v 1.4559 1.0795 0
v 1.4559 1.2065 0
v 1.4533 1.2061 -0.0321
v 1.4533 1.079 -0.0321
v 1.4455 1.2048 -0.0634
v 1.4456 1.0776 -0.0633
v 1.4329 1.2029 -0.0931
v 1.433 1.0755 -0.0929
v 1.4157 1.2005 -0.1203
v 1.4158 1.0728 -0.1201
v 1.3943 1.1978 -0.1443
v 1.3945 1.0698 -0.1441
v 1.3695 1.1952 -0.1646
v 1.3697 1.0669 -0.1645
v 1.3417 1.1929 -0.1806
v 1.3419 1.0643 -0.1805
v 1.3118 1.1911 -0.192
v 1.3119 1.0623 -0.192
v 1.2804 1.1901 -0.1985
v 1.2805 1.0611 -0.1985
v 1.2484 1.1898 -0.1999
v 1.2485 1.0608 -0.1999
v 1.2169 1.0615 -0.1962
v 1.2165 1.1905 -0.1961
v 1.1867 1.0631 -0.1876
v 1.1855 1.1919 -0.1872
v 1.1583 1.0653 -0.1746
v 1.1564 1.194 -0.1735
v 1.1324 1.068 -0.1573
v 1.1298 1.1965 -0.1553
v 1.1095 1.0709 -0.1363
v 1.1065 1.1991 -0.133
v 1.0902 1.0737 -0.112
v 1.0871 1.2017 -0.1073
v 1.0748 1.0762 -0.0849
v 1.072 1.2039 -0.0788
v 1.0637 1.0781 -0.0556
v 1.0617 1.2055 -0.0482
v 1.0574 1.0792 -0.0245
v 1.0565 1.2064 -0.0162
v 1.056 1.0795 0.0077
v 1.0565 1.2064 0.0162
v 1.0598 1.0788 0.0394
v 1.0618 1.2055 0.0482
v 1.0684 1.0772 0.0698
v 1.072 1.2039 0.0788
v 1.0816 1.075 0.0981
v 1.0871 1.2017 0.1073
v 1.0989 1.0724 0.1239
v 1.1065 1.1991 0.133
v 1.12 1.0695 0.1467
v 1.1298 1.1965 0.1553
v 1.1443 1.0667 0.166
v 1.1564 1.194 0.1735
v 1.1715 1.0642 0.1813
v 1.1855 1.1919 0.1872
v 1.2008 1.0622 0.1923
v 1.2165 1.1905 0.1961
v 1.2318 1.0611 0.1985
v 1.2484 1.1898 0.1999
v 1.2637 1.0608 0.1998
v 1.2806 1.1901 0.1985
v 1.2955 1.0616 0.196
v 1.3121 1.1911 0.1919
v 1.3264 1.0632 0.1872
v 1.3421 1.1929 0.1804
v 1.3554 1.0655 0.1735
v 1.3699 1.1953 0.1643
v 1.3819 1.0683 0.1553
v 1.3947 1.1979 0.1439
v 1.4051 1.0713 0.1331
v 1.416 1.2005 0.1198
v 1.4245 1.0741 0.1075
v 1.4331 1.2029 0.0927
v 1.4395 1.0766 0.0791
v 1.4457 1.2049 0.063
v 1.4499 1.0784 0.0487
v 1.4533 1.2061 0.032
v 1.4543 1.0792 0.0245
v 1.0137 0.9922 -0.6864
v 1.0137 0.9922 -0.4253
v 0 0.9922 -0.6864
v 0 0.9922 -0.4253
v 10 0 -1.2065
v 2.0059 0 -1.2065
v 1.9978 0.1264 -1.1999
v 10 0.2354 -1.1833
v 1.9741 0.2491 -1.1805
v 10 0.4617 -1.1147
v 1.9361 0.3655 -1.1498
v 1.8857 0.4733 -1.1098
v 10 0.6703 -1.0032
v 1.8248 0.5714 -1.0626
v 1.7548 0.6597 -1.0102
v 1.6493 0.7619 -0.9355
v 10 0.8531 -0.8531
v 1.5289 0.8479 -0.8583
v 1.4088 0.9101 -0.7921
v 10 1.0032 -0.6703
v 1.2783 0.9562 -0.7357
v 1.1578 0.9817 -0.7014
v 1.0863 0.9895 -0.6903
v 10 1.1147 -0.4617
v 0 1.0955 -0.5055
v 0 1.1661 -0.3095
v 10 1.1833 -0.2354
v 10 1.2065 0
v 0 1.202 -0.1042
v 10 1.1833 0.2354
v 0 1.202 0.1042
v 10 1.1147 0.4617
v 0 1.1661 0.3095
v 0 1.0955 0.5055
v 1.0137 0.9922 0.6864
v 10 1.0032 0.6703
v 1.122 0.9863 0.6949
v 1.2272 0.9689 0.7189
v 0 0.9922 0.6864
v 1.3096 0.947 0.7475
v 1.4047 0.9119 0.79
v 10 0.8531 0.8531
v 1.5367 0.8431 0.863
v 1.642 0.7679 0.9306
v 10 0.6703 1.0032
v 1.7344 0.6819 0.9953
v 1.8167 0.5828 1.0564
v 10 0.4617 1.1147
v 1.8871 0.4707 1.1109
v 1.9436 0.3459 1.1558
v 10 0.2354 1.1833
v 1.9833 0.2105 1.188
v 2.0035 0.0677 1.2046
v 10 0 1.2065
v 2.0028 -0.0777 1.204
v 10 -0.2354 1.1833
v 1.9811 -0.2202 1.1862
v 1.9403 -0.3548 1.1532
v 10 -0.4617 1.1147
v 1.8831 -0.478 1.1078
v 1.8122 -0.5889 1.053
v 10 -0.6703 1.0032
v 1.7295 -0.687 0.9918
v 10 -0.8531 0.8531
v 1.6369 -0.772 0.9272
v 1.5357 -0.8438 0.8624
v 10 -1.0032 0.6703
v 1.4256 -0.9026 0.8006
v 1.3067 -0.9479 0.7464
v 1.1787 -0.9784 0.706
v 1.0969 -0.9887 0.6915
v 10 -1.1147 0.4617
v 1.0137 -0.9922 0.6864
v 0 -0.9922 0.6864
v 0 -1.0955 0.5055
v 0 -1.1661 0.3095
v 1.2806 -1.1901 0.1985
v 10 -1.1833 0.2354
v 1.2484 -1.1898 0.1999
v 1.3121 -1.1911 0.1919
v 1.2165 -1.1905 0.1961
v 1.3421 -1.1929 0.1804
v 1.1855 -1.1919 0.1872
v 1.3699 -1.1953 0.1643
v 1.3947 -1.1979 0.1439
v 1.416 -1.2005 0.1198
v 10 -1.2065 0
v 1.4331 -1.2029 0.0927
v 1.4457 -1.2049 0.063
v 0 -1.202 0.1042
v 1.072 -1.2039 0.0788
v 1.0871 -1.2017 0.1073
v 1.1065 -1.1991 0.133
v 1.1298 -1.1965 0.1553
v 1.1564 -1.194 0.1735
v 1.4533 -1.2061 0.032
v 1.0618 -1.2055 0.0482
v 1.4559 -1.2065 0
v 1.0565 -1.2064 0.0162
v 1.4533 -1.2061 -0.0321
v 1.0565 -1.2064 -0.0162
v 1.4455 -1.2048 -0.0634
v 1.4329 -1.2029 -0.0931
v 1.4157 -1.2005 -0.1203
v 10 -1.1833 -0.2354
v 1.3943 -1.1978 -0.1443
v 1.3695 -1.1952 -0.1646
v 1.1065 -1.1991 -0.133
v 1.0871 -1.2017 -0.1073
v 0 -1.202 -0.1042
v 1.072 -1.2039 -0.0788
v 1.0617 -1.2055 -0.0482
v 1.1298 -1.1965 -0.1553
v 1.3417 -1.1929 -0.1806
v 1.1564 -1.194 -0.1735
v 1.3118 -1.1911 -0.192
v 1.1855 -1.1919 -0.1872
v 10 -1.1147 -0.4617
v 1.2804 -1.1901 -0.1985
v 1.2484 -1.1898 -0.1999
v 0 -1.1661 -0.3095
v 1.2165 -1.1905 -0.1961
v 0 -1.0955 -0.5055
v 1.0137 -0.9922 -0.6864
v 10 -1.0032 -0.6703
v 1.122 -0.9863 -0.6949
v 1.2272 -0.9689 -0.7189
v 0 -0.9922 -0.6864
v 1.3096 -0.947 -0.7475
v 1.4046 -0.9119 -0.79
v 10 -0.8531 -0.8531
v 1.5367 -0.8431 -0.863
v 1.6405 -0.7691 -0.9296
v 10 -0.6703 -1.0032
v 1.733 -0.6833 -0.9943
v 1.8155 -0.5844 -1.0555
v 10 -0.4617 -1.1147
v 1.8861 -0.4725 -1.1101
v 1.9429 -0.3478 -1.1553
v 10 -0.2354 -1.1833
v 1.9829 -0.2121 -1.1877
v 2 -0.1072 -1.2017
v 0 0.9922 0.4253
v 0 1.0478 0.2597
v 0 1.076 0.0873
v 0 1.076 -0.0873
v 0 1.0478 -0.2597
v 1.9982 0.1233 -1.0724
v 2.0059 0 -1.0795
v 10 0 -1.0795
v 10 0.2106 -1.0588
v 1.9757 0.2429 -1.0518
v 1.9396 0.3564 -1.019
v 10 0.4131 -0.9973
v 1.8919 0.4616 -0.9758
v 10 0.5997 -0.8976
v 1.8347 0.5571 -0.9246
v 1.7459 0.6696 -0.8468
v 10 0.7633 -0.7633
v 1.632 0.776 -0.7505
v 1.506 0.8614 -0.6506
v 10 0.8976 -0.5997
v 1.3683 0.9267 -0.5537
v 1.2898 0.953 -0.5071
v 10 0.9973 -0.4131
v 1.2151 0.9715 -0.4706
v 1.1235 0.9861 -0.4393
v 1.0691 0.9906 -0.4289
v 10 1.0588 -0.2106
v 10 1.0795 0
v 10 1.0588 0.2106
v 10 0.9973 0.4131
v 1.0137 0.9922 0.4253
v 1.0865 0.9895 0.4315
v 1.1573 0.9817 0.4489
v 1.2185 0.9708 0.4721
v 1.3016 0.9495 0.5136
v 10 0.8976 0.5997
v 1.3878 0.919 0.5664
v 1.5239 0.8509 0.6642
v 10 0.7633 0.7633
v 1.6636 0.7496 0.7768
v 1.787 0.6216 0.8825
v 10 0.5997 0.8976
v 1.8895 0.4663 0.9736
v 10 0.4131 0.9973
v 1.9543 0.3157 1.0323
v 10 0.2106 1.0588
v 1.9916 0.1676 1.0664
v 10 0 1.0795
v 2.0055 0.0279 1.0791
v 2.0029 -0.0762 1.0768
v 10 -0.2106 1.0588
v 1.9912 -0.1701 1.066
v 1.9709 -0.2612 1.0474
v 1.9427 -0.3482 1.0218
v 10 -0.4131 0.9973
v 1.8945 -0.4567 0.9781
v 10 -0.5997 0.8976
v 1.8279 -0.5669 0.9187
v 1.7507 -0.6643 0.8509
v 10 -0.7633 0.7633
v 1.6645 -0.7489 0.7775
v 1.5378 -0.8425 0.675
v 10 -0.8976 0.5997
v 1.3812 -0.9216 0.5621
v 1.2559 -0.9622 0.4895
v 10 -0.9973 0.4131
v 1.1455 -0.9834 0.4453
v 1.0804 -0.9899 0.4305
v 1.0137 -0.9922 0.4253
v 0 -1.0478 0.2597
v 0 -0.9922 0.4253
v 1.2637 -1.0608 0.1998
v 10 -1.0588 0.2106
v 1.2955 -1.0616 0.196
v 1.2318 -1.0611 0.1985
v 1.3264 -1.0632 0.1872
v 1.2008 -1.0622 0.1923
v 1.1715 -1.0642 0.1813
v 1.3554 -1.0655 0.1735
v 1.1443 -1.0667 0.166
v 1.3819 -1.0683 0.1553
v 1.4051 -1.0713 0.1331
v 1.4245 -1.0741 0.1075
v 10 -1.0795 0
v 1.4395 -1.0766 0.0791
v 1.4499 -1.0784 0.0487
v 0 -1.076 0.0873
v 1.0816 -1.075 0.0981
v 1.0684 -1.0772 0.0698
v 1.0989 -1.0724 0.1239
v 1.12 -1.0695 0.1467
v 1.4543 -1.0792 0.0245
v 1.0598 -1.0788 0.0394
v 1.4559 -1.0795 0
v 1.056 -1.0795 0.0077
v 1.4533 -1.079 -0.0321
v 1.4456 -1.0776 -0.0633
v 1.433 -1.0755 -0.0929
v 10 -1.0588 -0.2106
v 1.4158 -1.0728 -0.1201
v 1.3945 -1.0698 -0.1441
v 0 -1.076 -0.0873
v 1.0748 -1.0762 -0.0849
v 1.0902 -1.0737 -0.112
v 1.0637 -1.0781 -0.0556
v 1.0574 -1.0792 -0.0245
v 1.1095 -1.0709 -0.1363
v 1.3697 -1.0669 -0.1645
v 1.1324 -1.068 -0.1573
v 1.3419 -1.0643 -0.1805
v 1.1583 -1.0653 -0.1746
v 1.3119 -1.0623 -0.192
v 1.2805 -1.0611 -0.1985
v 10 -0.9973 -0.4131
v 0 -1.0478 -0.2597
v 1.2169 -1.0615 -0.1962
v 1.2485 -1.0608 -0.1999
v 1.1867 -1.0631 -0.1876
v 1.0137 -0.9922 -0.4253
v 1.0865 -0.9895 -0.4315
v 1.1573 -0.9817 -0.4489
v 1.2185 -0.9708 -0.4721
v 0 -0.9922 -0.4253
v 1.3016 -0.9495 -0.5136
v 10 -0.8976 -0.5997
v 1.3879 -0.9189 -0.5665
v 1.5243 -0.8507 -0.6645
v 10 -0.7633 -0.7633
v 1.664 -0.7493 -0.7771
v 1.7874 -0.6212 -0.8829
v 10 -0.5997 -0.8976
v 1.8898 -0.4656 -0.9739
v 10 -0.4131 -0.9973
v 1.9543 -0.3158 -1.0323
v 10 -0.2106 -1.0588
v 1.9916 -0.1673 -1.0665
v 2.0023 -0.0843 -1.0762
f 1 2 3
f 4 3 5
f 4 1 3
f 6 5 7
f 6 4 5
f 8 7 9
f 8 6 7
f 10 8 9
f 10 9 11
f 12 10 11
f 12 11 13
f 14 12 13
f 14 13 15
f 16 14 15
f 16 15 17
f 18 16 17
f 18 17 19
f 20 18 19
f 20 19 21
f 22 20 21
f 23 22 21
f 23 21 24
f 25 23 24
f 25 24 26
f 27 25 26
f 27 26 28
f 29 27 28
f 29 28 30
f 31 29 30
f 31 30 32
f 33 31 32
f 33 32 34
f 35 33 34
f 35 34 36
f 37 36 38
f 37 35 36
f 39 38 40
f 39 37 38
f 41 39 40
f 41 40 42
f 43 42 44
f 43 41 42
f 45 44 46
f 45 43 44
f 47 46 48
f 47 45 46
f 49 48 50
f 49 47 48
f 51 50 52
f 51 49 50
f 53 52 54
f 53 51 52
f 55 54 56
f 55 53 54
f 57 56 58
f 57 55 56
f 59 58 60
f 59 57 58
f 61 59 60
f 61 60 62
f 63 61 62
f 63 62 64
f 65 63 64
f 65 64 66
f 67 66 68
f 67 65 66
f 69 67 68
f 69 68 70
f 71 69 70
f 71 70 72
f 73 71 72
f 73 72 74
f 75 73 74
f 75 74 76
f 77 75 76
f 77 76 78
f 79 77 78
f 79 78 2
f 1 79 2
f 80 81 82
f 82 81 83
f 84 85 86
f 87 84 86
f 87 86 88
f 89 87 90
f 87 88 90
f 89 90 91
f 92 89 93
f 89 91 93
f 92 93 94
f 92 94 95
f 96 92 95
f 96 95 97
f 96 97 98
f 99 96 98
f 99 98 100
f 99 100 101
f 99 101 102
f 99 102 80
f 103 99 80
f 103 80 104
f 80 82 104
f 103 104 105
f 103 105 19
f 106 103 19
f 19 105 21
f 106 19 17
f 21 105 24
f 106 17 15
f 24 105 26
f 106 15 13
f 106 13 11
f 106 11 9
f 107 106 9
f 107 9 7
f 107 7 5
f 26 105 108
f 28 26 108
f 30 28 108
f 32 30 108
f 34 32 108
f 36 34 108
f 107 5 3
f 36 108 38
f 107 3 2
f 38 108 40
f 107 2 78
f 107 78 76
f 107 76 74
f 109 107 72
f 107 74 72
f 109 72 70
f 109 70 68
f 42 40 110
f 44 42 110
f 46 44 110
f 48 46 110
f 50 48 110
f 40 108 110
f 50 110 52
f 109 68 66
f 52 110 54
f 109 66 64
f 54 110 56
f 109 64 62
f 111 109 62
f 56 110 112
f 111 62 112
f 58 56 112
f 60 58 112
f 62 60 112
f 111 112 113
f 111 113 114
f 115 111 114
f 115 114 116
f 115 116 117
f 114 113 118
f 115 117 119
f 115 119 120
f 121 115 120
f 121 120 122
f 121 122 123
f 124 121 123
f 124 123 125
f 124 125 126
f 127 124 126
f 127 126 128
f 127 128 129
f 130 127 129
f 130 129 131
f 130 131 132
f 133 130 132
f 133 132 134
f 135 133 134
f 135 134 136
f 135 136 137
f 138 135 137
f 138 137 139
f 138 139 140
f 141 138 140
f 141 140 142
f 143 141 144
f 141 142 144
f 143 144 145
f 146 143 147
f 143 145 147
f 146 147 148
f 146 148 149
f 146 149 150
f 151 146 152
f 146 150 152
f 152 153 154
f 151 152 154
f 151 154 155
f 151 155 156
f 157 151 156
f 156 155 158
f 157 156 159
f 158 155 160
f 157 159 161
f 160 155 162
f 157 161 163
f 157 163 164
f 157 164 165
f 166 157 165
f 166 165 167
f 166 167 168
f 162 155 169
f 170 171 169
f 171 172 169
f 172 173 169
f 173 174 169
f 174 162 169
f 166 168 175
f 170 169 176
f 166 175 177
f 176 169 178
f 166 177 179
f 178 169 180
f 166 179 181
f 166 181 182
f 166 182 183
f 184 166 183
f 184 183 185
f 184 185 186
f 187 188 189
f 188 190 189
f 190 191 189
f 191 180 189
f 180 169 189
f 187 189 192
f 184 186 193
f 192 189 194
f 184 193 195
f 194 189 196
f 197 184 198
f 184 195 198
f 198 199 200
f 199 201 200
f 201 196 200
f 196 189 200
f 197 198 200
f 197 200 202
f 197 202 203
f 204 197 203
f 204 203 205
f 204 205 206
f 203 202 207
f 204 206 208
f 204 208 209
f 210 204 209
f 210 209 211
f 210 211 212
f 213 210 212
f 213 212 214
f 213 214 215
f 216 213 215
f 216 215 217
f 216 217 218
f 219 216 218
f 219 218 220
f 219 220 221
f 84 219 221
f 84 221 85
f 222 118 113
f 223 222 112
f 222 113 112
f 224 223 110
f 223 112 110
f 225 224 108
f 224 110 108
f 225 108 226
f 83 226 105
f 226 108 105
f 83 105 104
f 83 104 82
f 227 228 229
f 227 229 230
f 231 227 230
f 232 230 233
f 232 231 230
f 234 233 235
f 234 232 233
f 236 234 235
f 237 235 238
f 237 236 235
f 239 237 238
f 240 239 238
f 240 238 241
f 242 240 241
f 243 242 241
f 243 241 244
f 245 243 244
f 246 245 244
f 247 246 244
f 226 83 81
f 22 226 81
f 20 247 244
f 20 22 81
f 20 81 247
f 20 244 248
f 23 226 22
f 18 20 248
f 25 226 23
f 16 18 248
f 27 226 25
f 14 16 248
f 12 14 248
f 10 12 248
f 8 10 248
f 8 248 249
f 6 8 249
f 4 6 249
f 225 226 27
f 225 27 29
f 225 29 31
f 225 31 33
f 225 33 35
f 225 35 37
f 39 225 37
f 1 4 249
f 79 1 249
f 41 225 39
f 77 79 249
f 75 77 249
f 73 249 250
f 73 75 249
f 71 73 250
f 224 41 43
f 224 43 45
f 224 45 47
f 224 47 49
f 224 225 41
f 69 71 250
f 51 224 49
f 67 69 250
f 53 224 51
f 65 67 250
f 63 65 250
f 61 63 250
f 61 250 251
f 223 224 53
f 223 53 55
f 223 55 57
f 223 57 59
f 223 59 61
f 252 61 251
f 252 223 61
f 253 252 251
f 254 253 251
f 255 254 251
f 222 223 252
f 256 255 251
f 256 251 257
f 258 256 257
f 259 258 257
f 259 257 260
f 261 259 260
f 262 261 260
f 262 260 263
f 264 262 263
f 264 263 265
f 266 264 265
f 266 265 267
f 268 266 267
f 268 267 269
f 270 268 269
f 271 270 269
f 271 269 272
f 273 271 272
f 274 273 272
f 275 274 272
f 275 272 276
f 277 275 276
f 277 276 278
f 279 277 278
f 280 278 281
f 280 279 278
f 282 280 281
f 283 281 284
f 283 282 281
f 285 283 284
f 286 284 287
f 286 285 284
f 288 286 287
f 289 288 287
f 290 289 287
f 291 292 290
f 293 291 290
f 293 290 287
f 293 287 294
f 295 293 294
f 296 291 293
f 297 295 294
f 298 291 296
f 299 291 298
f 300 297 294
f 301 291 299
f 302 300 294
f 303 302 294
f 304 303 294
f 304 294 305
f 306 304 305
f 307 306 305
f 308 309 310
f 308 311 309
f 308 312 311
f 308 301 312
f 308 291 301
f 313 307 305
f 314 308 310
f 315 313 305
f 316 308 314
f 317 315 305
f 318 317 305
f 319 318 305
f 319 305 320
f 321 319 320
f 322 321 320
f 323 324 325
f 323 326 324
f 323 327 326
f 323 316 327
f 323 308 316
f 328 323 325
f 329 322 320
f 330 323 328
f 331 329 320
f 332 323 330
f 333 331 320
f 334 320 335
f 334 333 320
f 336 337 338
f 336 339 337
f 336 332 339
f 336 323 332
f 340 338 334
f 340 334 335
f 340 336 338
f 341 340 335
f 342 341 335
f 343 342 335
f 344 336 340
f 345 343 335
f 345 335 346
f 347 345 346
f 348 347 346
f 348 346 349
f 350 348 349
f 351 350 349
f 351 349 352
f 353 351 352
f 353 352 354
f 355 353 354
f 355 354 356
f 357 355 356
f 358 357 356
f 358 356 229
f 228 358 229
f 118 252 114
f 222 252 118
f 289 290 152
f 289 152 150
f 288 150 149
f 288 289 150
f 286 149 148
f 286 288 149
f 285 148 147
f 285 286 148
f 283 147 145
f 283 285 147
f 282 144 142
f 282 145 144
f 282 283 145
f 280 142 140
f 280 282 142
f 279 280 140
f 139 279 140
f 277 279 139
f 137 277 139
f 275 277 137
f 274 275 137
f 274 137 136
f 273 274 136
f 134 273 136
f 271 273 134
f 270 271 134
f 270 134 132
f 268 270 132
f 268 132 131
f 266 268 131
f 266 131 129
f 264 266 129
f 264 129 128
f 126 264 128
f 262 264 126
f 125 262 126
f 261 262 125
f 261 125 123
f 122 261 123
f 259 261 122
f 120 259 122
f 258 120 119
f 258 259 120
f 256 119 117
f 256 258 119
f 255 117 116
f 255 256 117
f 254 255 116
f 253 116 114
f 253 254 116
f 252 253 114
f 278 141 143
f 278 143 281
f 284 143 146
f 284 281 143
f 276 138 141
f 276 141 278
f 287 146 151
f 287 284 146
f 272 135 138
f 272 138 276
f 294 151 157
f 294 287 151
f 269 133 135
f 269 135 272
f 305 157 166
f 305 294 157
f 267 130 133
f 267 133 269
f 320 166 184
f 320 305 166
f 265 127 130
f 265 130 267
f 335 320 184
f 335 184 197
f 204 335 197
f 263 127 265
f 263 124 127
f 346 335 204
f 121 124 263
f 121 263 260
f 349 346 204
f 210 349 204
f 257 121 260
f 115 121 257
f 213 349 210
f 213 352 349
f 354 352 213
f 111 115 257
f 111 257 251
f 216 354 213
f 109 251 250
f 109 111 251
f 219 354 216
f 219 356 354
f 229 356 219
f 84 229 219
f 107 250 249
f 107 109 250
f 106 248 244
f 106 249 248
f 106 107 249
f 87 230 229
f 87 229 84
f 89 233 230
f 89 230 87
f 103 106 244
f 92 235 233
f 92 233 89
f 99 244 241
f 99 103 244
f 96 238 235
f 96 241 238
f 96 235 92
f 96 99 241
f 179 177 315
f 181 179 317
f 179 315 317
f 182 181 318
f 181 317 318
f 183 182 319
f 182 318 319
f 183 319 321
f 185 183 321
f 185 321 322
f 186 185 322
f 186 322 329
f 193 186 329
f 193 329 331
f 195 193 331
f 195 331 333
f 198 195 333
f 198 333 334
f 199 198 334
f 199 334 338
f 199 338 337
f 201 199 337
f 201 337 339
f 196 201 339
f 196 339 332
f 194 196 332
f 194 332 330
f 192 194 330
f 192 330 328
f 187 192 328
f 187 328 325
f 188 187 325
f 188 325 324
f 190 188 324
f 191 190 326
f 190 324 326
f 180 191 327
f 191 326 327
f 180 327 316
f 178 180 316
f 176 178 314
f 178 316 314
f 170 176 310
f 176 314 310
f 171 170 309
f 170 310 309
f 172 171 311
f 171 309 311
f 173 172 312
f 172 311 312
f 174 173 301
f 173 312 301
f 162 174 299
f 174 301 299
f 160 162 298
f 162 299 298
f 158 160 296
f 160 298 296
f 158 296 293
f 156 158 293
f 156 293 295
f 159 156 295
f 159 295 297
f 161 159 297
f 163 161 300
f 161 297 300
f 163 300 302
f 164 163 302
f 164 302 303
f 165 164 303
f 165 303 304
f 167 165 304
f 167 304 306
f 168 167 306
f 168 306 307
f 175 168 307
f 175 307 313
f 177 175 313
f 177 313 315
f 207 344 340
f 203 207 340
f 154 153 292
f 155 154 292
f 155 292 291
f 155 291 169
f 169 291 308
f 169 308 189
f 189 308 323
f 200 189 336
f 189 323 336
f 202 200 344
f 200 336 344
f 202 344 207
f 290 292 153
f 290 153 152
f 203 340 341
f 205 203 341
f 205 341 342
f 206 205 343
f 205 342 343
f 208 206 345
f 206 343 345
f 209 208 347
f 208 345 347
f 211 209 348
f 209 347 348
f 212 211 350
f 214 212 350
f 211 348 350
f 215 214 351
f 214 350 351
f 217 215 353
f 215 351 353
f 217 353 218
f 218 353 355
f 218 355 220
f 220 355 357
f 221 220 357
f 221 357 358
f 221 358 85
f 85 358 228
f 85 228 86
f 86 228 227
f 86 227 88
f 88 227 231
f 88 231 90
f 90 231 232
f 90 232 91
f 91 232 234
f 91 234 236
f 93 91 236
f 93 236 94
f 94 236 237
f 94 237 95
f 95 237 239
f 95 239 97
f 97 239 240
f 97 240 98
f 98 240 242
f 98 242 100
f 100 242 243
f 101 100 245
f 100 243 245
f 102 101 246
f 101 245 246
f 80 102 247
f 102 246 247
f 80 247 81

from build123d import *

# Parameters (mm, degrees)
SKETCH1_R               = 1.2065
SKETCH1_R_2             = 1.0795
BOSS_EXTRUDE1_DEPTH     = 10
CUT_EXTRUDE4_DEPTH      = 10
CUT_EXTRUDE4_DEPTH_BACK = 10
CUT_EXTRUDE5_DEPTH      = 10
CUT_EXTRUDE5_DEPTH_BACK = 10
SKETCH6_R               = 0.2


with BuildPart() as part:
    # Sketch1 → Boss-Extrude1 (new body)
    with BuildSketch(Plane(origin=(0, 0, 0), x_dir=(0, 0, -1), z_dir=(1, 0, 0))):
        Circle(SKETCH1_R)
        Circle(SKETCH1_R_2, mode=Mode.SUBTRACT)
    extrude(amount=BOSS_EXTRUDE1_DEPTH)

    # Sketch5 → Cut-Extrude4 (cut, two sides: drawn at the far end of the back side and taken through both)
    with BuildSketch(Plane.XY.offset(-CUT_EXTRUDE4_DEPTH_BACK)):
        with BuildLine():
            Line((1.013670485, 0.9921875), (0, 0.9921875))
            Line((0, 0.9921875), (0, -0.9921875))
            Line((0, -0.9921875), (1.013670485, -0.9921875))
            ThreePointArc((1.013670485, -0.9921875), (2.005857985, 0), (1.013670485, 0.9921875))
        make_face()
    extrude(amount=CUT_EXTRUDE4_DEPTH + CUT_EXTRUDE4_DEPTH_BACK, mode=Mode.SUBTRACT)

    # Sketch6 → Cut-Extrude5 (cut, two sides: drawn at the far end of the back side and taken through both)
    with BuildSketch(Plane(origin=(0, 0, 0), x_dir=(1, 0, 0), z_dir=(0, 1, 0)).offset(-CUT_EXTRUDE5_DEPTH_BACK)):
        with Locations((1.255857985, 0)):
            Circle(SKETCH6_R)
    extrude(amount=CUT_EXTRUDE5_DEPTH + CUT_EXTRUDE5_DEPTH_BACK, mode=Mode.SUBTRACT)


solid = part.part
